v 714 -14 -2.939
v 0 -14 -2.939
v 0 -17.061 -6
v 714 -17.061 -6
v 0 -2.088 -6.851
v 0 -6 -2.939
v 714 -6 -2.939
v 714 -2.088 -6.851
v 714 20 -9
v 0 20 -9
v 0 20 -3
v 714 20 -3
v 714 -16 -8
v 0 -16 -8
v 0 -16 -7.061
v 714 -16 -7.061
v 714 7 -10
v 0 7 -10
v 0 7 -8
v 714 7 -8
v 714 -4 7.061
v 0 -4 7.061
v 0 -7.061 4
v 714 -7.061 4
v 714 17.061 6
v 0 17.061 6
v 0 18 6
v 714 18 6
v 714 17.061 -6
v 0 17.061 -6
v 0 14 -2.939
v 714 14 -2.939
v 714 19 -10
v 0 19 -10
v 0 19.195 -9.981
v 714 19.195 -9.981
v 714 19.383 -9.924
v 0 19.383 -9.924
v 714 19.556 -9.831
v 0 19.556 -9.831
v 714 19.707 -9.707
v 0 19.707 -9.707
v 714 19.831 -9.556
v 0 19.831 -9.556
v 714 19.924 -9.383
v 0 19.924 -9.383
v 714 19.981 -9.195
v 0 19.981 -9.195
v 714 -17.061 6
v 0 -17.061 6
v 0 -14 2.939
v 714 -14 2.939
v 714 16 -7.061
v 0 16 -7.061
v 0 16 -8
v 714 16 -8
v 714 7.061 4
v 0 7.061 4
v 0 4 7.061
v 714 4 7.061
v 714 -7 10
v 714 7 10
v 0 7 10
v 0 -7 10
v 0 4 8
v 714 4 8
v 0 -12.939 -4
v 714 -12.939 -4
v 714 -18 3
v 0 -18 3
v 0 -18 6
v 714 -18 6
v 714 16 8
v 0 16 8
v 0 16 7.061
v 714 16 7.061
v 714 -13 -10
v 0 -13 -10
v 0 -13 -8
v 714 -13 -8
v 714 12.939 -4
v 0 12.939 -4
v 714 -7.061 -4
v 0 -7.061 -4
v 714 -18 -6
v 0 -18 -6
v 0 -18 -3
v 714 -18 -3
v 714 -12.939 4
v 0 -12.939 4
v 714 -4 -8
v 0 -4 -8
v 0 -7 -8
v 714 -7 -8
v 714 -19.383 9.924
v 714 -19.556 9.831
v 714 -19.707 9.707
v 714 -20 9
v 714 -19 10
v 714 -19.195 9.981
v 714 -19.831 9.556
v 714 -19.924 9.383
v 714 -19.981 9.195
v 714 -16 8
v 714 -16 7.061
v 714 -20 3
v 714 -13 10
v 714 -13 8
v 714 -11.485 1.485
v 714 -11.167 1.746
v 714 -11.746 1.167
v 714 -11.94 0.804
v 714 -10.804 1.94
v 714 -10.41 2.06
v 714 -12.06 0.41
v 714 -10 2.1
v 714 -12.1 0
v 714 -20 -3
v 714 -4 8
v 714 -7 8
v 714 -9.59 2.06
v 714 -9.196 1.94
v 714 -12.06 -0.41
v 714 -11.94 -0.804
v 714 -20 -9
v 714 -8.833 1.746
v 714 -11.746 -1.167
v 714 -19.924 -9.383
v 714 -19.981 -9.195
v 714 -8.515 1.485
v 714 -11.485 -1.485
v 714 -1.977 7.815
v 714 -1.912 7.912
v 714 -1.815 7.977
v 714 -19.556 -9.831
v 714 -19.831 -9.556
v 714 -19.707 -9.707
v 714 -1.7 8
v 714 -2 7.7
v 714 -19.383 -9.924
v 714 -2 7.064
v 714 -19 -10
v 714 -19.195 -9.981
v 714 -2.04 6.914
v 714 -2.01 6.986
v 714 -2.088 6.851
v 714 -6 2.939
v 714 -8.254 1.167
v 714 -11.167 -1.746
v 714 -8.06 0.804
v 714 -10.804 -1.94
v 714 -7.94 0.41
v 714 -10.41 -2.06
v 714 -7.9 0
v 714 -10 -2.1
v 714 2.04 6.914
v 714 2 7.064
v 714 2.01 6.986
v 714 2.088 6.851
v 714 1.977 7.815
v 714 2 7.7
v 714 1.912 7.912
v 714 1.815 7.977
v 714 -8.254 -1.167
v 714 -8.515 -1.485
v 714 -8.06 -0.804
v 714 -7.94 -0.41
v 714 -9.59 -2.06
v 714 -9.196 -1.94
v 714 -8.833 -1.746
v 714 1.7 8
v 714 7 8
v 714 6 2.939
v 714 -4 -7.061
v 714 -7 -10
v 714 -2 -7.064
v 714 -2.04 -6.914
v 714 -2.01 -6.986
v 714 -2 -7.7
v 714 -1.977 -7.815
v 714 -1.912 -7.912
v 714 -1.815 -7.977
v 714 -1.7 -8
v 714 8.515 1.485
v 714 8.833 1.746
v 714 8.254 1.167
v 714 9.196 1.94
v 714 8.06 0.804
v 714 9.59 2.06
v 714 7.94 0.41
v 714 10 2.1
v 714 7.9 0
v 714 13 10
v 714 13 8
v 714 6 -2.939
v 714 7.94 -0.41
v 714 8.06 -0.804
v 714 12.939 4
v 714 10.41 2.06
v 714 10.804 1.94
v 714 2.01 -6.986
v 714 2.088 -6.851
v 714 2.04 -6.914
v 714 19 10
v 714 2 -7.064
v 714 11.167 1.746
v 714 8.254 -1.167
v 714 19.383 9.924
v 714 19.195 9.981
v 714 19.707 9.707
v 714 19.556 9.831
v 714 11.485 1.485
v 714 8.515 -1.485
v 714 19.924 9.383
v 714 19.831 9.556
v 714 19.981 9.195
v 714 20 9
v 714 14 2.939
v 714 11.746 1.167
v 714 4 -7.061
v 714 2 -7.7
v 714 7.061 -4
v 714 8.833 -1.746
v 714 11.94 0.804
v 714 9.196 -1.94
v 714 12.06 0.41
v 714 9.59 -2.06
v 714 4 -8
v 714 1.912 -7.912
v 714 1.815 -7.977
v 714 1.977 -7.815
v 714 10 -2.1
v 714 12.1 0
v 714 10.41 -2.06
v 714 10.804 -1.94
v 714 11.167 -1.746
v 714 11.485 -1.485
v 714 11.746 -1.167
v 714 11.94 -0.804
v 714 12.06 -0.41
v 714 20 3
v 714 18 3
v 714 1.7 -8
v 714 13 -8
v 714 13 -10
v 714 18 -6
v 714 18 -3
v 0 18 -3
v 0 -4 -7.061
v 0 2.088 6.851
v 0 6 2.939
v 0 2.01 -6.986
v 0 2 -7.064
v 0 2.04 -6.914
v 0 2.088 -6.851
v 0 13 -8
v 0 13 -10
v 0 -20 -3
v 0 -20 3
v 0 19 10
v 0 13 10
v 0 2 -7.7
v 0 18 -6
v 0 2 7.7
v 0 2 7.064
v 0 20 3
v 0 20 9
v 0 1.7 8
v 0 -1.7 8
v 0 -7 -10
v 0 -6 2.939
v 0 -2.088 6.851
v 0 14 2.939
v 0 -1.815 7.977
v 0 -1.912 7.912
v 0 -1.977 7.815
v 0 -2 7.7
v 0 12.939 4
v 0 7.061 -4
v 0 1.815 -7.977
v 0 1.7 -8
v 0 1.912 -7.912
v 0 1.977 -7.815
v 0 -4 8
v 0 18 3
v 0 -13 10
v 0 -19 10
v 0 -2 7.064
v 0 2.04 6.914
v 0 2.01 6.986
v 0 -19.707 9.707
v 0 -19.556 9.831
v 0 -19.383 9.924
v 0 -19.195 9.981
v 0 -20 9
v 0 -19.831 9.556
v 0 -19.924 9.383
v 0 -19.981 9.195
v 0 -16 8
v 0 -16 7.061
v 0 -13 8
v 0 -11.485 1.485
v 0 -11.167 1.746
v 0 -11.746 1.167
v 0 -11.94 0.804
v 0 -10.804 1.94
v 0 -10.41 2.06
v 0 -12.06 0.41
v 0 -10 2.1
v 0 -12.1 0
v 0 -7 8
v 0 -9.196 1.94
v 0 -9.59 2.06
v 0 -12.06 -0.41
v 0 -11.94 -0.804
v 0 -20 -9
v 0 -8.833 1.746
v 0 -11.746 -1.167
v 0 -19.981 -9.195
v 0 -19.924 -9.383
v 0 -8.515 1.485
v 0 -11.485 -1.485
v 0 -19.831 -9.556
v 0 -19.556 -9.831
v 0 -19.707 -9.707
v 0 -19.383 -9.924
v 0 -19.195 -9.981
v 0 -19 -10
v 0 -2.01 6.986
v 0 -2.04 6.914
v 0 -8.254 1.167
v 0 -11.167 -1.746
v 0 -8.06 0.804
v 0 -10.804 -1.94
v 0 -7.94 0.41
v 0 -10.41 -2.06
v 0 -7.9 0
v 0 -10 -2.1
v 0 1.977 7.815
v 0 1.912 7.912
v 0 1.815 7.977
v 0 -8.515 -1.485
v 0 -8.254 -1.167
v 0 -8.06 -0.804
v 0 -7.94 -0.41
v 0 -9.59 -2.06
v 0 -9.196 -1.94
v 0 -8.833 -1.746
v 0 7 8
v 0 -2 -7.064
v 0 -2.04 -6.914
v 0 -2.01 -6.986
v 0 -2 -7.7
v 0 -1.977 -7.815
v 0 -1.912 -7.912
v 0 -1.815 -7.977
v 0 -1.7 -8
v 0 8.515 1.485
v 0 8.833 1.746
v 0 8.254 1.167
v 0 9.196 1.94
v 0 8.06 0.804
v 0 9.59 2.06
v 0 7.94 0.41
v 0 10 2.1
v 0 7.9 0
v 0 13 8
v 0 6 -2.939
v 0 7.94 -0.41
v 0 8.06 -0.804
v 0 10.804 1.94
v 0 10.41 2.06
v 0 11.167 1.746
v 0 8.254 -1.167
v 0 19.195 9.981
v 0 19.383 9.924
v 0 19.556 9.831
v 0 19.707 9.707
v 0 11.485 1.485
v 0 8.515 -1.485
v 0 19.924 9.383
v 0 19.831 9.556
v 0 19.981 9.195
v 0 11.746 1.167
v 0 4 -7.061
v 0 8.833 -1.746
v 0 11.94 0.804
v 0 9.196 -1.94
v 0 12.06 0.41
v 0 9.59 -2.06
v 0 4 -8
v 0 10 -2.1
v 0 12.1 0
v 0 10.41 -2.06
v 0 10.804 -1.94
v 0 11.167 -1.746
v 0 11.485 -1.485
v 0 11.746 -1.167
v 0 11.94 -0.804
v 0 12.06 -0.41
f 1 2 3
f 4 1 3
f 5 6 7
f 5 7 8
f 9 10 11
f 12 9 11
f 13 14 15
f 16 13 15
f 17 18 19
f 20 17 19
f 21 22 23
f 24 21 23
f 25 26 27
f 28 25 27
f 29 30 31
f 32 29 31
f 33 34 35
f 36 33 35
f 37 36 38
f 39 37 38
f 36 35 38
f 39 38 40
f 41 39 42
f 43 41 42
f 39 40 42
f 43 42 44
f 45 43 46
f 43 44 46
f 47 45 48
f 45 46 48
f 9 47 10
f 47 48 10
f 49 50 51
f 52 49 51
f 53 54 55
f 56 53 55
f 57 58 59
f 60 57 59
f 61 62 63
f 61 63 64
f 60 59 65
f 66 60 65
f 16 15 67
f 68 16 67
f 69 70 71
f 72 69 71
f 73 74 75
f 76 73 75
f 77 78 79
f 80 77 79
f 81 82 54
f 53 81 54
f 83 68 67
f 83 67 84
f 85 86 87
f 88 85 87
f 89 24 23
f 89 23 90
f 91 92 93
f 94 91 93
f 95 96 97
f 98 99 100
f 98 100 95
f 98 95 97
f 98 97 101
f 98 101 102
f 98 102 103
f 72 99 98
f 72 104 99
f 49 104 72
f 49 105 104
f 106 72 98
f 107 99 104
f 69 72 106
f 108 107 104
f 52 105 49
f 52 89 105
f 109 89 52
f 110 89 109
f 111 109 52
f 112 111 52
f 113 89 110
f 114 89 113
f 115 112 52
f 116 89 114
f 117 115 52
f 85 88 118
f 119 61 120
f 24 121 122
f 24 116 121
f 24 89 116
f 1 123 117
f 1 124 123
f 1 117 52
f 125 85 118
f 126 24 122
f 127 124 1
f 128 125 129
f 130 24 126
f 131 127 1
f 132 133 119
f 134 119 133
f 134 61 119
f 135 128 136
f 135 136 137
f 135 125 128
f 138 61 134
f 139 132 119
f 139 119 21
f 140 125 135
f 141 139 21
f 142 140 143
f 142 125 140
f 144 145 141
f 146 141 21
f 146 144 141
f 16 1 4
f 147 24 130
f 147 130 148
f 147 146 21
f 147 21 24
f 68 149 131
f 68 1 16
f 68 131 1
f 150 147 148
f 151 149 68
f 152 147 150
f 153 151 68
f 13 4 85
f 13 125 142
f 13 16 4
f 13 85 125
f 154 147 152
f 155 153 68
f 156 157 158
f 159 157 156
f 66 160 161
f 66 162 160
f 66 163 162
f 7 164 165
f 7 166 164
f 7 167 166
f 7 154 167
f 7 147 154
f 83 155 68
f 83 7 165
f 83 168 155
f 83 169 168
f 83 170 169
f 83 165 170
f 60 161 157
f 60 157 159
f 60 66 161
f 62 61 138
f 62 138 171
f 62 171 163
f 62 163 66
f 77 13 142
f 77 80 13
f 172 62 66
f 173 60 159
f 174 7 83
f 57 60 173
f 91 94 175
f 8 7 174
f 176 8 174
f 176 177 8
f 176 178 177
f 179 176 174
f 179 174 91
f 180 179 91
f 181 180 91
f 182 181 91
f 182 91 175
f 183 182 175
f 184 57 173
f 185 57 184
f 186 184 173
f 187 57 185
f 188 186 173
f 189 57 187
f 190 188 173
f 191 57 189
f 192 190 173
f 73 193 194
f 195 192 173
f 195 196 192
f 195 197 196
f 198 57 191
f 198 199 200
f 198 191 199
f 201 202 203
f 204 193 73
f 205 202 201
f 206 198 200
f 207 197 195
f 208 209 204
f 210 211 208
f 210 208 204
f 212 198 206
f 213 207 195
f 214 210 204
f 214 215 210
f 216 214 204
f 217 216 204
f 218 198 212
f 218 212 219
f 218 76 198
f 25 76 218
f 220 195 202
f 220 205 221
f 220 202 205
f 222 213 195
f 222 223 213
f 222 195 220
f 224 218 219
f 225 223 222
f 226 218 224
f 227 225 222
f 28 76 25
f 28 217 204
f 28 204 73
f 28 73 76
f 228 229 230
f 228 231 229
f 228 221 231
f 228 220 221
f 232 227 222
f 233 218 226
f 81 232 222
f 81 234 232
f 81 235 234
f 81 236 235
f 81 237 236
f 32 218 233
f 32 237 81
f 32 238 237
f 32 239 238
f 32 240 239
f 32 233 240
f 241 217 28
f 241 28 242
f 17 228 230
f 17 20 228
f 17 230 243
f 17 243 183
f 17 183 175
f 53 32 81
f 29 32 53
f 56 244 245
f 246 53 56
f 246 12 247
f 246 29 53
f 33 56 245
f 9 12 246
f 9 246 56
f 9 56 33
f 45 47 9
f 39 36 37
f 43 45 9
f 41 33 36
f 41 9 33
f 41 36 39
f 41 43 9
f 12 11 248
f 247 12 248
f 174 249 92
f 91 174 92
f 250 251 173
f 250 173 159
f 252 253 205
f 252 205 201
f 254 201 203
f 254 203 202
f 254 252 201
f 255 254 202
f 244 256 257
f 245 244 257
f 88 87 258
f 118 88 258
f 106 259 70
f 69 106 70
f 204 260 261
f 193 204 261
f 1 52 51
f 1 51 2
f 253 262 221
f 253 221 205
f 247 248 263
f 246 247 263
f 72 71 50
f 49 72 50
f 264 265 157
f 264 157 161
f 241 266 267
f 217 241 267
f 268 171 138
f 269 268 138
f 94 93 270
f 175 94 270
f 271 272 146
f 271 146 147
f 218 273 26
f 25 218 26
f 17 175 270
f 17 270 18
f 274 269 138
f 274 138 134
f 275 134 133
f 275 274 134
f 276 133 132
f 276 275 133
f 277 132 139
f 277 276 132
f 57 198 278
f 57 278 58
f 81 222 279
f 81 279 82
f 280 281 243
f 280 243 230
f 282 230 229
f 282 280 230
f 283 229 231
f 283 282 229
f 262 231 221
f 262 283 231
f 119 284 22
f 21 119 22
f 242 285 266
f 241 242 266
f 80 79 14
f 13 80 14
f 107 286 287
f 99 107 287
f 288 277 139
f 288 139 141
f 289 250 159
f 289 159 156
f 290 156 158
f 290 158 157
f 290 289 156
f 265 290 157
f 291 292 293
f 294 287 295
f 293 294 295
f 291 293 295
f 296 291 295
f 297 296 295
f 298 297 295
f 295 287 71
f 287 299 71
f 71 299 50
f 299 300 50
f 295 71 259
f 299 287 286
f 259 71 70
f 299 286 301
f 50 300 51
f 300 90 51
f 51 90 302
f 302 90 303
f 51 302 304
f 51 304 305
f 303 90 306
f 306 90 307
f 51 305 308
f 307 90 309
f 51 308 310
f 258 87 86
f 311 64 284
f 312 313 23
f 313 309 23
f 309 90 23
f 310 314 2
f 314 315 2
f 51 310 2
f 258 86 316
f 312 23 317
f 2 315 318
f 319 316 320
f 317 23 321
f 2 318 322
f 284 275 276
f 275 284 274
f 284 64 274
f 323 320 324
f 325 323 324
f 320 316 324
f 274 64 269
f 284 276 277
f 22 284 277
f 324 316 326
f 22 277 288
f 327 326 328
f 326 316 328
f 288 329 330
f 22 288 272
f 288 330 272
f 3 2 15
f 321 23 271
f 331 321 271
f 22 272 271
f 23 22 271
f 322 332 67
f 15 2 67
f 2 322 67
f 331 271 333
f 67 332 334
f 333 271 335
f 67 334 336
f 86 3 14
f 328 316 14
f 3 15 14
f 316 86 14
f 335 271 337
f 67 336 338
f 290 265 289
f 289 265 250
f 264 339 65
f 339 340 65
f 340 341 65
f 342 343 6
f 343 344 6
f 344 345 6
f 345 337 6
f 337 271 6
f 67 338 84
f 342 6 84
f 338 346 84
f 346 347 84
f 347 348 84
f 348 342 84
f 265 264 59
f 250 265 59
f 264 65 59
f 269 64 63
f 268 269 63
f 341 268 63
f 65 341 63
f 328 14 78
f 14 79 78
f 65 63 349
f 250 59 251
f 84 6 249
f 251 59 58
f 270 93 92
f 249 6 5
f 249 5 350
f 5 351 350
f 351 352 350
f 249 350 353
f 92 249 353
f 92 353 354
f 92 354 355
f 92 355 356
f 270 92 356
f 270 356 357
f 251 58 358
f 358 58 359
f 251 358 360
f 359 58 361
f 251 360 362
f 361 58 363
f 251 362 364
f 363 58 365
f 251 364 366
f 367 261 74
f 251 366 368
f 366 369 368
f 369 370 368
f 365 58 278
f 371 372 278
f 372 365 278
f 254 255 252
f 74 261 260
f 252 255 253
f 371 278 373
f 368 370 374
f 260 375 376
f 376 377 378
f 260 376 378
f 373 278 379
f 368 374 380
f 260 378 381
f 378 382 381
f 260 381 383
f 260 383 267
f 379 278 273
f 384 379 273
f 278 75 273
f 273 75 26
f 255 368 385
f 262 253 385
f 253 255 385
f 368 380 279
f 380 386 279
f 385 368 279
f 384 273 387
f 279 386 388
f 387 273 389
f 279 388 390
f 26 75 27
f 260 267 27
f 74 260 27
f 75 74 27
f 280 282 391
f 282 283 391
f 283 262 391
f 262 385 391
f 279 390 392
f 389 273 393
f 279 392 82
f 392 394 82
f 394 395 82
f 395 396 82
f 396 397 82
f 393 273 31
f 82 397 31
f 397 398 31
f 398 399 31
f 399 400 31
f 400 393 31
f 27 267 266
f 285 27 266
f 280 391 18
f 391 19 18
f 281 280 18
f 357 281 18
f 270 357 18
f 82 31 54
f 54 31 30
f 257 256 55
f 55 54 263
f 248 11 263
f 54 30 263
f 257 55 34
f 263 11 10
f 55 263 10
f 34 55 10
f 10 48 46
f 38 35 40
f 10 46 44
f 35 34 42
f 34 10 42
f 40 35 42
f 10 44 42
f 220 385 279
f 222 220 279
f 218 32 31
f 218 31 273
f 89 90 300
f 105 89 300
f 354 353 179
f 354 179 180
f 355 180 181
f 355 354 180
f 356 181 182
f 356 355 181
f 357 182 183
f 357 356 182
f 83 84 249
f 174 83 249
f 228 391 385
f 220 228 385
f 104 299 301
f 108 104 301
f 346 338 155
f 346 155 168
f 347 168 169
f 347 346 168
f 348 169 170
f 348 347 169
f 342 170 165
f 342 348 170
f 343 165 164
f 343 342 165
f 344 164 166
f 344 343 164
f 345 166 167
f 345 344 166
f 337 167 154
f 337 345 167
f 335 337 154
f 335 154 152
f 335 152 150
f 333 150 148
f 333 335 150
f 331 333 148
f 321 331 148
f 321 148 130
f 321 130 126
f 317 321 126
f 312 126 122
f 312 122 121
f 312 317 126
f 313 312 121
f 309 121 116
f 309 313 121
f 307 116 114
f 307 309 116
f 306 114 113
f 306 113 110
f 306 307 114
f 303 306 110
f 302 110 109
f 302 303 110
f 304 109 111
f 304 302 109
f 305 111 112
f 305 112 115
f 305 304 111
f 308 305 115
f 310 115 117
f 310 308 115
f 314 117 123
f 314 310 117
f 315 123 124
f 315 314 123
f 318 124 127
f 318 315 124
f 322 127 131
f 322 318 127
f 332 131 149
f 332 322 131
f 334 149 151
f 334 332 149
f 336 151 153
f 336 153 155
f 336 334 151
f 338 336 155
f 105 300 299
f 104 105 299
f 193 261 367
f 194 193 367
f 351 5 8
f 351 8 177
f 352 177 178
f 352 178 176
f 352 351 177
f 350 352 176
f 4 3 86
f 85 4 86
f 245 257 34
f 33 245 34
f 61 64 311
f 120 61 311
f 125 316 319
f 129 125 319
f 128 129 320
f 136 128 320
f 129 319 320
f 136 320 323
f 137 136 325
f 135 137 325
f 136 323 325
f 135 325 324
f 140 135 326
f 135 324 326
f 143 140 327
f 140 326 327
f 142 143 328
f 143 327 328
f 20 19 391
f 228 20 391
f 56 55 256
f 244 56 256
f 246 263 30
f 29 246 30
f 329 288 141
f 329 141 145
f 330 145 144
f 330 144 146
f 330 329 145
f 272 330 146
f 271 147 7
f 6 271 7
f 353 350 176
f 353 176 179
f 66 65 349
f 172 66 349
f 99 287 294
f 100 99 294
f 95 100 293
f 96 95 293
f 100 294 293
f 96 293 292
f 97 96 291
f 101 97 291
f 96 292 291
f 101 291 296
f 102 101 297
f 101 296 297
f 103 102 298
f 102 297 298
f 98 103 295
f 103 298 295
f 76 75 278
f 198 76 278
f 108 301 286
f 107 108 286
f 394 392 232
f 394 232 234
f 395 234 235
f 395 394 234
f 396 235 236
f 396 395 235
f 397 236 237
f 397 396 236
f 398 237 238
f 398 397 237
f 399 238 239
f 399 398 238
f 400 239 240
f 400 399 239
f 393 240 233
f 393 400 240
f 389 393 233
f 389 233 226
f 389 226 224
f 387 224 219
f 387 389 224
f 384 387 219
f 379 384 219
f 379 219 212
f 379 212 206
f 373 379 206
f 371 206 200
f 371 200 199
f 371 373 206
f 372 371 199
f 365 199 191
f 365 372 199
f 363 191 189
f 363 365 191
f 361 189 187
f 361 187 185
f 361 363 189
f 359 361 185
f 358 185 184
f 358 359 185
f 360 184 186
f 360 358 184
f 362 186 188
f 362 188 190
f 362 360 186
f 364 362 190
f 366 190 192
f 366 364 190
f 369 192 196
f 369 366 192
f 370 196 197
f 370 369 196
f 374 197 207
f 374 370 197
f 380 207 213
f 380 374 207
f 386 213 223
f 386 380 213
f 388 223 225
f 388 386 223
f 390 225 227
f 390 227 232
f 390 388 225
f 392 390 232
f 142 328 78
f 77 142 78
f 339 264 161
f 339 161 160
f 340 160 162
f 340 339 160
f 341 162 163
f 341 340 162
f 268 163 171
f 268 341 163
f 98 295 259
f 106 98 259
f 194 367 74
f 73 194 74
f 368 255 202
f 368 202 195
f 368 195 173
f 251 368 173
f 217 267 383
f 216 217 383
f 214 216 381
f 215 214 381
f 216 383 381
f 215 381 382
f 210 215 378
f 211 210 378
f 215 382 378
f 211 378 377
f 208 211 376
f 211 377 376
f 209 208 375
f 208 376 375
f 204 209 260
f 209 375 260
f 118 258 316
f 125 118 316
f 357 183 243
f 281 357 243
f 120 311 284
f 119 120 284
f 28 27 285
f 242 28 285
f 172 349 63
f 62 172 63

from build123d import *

# Parameters (mm, degrees)
SKETCH1_R           = 2.1
BOSS_EXTRUDE1_DEPTH = 714


with BuildPart() as part:
    # Sketch1 → Boss-Extrude1 (new body)
    with BuildSketch(Plane(origin=(0, 0, 0), x_dir=(0, 0, -1), z_dir=(1, 0, 0))):
        with BuildLine():
            Line((-10, -13), (-10, -19))
            ThreePointArc((-10, -19), (-9.707106781, -19.707106781), (-9, -20))
            Line((-9, -20), (-3, -20))
            Line((-3, -20), (-3, -18))
            Line((-3, -18), (-6, -18))
            Line((-6, -18), (-6, -17.060660172))
            Line((-6, -17.060660172), (-2.939339828, -14))
            Line((-2.939339828, -14), (2.939339828, -14))
            Line((2.939339828, -14), (6, -17.060660172))
            Line((6, -17.060660172), (6, -18))
            Line((6, -18), (3, -18))
            Line((3, -18), (3, -20))
            Line((3, -20), (9, -20))
            ThreePointArc((9, -20), (9.707106781, -19.707106781), (10, -19))
            Line((10, -19), (10, -13))
            Line((10, -13), (8, -13))
            Line((8, -13), (8, -16))
            Line((8, -16), (7.060660172, -16))
            Line((7.060660172, -16), (4, -12.939339828))
            Line((4, -12.939339828), (4, -7.060660172))
            Line((4, -7.060660172), (7.060660172, -4))
            Line((7.060660172, -4), (8, -4))
            Line((8, -4), (8, -7))
            Line((8, -7), (10, -7))
            Line((10, -7), (10, 7))
            Line((10, 7), (8, 7))
            Line((8, 7), (8, 4))
            Line((8, 4), (7.060660172, 4))
            Line((7.060660172, 4), (4, 7.060660172))
            Line((4, 7.060660172), (4, 12.939339828))
            Line((4, 12.939339828), (7.060660172, 16))
            Line((7.060660172, 16), (8, 16))
            Line((8, 16), (8, 13))
            Line((8, 13), (10, 13))
            Line((10, 13), (10, 19))
            ThreePointArc((10, 19), (9.707106781, 19.707106781), (9, 20))
            Line((9, 20), (3, 20))
            Line((3, 20), (3, 18))
            Line((3, 18), (6, 18))
            Line((6, 18), (6, 17.060660172))
            Line((6, 17.060660172), (2.939339828, 14))
            Line((2.939339828, 14), (-2.939339828, 14))
            Line((-2.939339828, 14), (-6, 17.060660172))
            Line((-6, 17.060660172), (-6, 18))
            Line((-6, 18), (-3, 18))
            Line((-3, 18), (-3, 20))
            Line((-3, 20), (-9, 20))
            ThreePointArc((-9, 20), (-9.707106781, 19.707106781), (-10, 19))
            Line((-10, 19), (-10, 13))
            Line((-10, 13), (-8, 13))
            Line((-8, 13), (-8, 16))
            Line((-8, 16), (-7.060660172, 16))
            Line((-7.060660172, 16), (-4, 12.939339828))
            Line((-4, 12.939339828), (-4, 7.060660172))
            Line((-4, 7.060660172), (-7.060660172, 4))
            Line((-7.060660172, 4), (-8, 4))
            Line((-8, 4), (-8, 7))
            Line((-8, 7), (-10, 7))
            Line((-10, 7), (-10, -7))
            Line((-10, -7), (-8, -7))
            Line((-8, -7), (-8, -4))
            Line((-8, -4), (-7.060660172, -4))
            Line((-7.060660172, -4), (-4, -7.060660172))
            Line((-4, -7.060660172), (-4, -12.939339828))
            Line((-4, -12.939339828), (-7.060660172, -16))
            Line((-7.060660172, -16), (-8, -16))
            Line((-8, -16), (-8, -13))
            Line((-8, -13), (-10, -13))
        make_face()
        with Locations((0, 10)):
            Circle(SKETCH1_R, mode=Mode.SUBTRACT)
        with Locations((0, -10)):
            Circle(SKETCH1_R, mode=Mode.SUBTRACT)
        with BuildLine():
            Line((-8, 1.7), (-8, -1.7))
            ThreePointArc((-8, -1.7), (-7.912132034, -1.912132034), (-7.7, -2))
            Line((-7.7, -2), (-7.063603897, -2))
            ThreePointArc((-7.063603897, -2), (-6.948798867, -2.02283614), (-6.851471863, -2.087867966))
            Line((-6.851471863, -2.087867966), (-2.939339828, -6))
            Line((-2.939339828, -6), (2.939339828, -6))
            Line((2.939339828, -6), (6.851471863, -2.087867966))
            ThreePointArc((6.851471863, -2.087867966), (6.948798867, -2.02283614), (7.063603897, -2))
            Line((7.063603897, -2), (7.7, -2))
            ThreePointArc((7.7, -2), (7.912132034, -1.912132034), (8, -1.7))
            Line((8, -1.7), (8, 1.7))
            ThreePointArc((8, 1.7), (7.912132034, 1.912132034), (7.7, 2))
            Line((7.7, 2), (7.063603897, 2))
            ThreePointArc((7.063603897, 2), (6.948798867, 2.02283614), (6.851471863, 2.087867966))
            Line((6.851471863, 2.087867966), (2.939339828, 6))
            Line((2.939339828, 6), (-2.939339828, 6))
            Line((-2.939339828, 6), (-6.851471863, 2.087867966))
            ThreePointArc((-6.851471863, 2.087867966), (-6.948798867, 2.02283614), (-7.063603897, 2))
            Line((-7.063603897, 2), (-7.7, 2))
            ThreePointArc((-7.7, 2), (-7.912132034, 1.912132034), (-8, 1.7))
        make_face(mode=Mode.SUBTRACT)
    extrude(amount=BOSS_EXTRUDE1_DEPTH)


solid = part.part
